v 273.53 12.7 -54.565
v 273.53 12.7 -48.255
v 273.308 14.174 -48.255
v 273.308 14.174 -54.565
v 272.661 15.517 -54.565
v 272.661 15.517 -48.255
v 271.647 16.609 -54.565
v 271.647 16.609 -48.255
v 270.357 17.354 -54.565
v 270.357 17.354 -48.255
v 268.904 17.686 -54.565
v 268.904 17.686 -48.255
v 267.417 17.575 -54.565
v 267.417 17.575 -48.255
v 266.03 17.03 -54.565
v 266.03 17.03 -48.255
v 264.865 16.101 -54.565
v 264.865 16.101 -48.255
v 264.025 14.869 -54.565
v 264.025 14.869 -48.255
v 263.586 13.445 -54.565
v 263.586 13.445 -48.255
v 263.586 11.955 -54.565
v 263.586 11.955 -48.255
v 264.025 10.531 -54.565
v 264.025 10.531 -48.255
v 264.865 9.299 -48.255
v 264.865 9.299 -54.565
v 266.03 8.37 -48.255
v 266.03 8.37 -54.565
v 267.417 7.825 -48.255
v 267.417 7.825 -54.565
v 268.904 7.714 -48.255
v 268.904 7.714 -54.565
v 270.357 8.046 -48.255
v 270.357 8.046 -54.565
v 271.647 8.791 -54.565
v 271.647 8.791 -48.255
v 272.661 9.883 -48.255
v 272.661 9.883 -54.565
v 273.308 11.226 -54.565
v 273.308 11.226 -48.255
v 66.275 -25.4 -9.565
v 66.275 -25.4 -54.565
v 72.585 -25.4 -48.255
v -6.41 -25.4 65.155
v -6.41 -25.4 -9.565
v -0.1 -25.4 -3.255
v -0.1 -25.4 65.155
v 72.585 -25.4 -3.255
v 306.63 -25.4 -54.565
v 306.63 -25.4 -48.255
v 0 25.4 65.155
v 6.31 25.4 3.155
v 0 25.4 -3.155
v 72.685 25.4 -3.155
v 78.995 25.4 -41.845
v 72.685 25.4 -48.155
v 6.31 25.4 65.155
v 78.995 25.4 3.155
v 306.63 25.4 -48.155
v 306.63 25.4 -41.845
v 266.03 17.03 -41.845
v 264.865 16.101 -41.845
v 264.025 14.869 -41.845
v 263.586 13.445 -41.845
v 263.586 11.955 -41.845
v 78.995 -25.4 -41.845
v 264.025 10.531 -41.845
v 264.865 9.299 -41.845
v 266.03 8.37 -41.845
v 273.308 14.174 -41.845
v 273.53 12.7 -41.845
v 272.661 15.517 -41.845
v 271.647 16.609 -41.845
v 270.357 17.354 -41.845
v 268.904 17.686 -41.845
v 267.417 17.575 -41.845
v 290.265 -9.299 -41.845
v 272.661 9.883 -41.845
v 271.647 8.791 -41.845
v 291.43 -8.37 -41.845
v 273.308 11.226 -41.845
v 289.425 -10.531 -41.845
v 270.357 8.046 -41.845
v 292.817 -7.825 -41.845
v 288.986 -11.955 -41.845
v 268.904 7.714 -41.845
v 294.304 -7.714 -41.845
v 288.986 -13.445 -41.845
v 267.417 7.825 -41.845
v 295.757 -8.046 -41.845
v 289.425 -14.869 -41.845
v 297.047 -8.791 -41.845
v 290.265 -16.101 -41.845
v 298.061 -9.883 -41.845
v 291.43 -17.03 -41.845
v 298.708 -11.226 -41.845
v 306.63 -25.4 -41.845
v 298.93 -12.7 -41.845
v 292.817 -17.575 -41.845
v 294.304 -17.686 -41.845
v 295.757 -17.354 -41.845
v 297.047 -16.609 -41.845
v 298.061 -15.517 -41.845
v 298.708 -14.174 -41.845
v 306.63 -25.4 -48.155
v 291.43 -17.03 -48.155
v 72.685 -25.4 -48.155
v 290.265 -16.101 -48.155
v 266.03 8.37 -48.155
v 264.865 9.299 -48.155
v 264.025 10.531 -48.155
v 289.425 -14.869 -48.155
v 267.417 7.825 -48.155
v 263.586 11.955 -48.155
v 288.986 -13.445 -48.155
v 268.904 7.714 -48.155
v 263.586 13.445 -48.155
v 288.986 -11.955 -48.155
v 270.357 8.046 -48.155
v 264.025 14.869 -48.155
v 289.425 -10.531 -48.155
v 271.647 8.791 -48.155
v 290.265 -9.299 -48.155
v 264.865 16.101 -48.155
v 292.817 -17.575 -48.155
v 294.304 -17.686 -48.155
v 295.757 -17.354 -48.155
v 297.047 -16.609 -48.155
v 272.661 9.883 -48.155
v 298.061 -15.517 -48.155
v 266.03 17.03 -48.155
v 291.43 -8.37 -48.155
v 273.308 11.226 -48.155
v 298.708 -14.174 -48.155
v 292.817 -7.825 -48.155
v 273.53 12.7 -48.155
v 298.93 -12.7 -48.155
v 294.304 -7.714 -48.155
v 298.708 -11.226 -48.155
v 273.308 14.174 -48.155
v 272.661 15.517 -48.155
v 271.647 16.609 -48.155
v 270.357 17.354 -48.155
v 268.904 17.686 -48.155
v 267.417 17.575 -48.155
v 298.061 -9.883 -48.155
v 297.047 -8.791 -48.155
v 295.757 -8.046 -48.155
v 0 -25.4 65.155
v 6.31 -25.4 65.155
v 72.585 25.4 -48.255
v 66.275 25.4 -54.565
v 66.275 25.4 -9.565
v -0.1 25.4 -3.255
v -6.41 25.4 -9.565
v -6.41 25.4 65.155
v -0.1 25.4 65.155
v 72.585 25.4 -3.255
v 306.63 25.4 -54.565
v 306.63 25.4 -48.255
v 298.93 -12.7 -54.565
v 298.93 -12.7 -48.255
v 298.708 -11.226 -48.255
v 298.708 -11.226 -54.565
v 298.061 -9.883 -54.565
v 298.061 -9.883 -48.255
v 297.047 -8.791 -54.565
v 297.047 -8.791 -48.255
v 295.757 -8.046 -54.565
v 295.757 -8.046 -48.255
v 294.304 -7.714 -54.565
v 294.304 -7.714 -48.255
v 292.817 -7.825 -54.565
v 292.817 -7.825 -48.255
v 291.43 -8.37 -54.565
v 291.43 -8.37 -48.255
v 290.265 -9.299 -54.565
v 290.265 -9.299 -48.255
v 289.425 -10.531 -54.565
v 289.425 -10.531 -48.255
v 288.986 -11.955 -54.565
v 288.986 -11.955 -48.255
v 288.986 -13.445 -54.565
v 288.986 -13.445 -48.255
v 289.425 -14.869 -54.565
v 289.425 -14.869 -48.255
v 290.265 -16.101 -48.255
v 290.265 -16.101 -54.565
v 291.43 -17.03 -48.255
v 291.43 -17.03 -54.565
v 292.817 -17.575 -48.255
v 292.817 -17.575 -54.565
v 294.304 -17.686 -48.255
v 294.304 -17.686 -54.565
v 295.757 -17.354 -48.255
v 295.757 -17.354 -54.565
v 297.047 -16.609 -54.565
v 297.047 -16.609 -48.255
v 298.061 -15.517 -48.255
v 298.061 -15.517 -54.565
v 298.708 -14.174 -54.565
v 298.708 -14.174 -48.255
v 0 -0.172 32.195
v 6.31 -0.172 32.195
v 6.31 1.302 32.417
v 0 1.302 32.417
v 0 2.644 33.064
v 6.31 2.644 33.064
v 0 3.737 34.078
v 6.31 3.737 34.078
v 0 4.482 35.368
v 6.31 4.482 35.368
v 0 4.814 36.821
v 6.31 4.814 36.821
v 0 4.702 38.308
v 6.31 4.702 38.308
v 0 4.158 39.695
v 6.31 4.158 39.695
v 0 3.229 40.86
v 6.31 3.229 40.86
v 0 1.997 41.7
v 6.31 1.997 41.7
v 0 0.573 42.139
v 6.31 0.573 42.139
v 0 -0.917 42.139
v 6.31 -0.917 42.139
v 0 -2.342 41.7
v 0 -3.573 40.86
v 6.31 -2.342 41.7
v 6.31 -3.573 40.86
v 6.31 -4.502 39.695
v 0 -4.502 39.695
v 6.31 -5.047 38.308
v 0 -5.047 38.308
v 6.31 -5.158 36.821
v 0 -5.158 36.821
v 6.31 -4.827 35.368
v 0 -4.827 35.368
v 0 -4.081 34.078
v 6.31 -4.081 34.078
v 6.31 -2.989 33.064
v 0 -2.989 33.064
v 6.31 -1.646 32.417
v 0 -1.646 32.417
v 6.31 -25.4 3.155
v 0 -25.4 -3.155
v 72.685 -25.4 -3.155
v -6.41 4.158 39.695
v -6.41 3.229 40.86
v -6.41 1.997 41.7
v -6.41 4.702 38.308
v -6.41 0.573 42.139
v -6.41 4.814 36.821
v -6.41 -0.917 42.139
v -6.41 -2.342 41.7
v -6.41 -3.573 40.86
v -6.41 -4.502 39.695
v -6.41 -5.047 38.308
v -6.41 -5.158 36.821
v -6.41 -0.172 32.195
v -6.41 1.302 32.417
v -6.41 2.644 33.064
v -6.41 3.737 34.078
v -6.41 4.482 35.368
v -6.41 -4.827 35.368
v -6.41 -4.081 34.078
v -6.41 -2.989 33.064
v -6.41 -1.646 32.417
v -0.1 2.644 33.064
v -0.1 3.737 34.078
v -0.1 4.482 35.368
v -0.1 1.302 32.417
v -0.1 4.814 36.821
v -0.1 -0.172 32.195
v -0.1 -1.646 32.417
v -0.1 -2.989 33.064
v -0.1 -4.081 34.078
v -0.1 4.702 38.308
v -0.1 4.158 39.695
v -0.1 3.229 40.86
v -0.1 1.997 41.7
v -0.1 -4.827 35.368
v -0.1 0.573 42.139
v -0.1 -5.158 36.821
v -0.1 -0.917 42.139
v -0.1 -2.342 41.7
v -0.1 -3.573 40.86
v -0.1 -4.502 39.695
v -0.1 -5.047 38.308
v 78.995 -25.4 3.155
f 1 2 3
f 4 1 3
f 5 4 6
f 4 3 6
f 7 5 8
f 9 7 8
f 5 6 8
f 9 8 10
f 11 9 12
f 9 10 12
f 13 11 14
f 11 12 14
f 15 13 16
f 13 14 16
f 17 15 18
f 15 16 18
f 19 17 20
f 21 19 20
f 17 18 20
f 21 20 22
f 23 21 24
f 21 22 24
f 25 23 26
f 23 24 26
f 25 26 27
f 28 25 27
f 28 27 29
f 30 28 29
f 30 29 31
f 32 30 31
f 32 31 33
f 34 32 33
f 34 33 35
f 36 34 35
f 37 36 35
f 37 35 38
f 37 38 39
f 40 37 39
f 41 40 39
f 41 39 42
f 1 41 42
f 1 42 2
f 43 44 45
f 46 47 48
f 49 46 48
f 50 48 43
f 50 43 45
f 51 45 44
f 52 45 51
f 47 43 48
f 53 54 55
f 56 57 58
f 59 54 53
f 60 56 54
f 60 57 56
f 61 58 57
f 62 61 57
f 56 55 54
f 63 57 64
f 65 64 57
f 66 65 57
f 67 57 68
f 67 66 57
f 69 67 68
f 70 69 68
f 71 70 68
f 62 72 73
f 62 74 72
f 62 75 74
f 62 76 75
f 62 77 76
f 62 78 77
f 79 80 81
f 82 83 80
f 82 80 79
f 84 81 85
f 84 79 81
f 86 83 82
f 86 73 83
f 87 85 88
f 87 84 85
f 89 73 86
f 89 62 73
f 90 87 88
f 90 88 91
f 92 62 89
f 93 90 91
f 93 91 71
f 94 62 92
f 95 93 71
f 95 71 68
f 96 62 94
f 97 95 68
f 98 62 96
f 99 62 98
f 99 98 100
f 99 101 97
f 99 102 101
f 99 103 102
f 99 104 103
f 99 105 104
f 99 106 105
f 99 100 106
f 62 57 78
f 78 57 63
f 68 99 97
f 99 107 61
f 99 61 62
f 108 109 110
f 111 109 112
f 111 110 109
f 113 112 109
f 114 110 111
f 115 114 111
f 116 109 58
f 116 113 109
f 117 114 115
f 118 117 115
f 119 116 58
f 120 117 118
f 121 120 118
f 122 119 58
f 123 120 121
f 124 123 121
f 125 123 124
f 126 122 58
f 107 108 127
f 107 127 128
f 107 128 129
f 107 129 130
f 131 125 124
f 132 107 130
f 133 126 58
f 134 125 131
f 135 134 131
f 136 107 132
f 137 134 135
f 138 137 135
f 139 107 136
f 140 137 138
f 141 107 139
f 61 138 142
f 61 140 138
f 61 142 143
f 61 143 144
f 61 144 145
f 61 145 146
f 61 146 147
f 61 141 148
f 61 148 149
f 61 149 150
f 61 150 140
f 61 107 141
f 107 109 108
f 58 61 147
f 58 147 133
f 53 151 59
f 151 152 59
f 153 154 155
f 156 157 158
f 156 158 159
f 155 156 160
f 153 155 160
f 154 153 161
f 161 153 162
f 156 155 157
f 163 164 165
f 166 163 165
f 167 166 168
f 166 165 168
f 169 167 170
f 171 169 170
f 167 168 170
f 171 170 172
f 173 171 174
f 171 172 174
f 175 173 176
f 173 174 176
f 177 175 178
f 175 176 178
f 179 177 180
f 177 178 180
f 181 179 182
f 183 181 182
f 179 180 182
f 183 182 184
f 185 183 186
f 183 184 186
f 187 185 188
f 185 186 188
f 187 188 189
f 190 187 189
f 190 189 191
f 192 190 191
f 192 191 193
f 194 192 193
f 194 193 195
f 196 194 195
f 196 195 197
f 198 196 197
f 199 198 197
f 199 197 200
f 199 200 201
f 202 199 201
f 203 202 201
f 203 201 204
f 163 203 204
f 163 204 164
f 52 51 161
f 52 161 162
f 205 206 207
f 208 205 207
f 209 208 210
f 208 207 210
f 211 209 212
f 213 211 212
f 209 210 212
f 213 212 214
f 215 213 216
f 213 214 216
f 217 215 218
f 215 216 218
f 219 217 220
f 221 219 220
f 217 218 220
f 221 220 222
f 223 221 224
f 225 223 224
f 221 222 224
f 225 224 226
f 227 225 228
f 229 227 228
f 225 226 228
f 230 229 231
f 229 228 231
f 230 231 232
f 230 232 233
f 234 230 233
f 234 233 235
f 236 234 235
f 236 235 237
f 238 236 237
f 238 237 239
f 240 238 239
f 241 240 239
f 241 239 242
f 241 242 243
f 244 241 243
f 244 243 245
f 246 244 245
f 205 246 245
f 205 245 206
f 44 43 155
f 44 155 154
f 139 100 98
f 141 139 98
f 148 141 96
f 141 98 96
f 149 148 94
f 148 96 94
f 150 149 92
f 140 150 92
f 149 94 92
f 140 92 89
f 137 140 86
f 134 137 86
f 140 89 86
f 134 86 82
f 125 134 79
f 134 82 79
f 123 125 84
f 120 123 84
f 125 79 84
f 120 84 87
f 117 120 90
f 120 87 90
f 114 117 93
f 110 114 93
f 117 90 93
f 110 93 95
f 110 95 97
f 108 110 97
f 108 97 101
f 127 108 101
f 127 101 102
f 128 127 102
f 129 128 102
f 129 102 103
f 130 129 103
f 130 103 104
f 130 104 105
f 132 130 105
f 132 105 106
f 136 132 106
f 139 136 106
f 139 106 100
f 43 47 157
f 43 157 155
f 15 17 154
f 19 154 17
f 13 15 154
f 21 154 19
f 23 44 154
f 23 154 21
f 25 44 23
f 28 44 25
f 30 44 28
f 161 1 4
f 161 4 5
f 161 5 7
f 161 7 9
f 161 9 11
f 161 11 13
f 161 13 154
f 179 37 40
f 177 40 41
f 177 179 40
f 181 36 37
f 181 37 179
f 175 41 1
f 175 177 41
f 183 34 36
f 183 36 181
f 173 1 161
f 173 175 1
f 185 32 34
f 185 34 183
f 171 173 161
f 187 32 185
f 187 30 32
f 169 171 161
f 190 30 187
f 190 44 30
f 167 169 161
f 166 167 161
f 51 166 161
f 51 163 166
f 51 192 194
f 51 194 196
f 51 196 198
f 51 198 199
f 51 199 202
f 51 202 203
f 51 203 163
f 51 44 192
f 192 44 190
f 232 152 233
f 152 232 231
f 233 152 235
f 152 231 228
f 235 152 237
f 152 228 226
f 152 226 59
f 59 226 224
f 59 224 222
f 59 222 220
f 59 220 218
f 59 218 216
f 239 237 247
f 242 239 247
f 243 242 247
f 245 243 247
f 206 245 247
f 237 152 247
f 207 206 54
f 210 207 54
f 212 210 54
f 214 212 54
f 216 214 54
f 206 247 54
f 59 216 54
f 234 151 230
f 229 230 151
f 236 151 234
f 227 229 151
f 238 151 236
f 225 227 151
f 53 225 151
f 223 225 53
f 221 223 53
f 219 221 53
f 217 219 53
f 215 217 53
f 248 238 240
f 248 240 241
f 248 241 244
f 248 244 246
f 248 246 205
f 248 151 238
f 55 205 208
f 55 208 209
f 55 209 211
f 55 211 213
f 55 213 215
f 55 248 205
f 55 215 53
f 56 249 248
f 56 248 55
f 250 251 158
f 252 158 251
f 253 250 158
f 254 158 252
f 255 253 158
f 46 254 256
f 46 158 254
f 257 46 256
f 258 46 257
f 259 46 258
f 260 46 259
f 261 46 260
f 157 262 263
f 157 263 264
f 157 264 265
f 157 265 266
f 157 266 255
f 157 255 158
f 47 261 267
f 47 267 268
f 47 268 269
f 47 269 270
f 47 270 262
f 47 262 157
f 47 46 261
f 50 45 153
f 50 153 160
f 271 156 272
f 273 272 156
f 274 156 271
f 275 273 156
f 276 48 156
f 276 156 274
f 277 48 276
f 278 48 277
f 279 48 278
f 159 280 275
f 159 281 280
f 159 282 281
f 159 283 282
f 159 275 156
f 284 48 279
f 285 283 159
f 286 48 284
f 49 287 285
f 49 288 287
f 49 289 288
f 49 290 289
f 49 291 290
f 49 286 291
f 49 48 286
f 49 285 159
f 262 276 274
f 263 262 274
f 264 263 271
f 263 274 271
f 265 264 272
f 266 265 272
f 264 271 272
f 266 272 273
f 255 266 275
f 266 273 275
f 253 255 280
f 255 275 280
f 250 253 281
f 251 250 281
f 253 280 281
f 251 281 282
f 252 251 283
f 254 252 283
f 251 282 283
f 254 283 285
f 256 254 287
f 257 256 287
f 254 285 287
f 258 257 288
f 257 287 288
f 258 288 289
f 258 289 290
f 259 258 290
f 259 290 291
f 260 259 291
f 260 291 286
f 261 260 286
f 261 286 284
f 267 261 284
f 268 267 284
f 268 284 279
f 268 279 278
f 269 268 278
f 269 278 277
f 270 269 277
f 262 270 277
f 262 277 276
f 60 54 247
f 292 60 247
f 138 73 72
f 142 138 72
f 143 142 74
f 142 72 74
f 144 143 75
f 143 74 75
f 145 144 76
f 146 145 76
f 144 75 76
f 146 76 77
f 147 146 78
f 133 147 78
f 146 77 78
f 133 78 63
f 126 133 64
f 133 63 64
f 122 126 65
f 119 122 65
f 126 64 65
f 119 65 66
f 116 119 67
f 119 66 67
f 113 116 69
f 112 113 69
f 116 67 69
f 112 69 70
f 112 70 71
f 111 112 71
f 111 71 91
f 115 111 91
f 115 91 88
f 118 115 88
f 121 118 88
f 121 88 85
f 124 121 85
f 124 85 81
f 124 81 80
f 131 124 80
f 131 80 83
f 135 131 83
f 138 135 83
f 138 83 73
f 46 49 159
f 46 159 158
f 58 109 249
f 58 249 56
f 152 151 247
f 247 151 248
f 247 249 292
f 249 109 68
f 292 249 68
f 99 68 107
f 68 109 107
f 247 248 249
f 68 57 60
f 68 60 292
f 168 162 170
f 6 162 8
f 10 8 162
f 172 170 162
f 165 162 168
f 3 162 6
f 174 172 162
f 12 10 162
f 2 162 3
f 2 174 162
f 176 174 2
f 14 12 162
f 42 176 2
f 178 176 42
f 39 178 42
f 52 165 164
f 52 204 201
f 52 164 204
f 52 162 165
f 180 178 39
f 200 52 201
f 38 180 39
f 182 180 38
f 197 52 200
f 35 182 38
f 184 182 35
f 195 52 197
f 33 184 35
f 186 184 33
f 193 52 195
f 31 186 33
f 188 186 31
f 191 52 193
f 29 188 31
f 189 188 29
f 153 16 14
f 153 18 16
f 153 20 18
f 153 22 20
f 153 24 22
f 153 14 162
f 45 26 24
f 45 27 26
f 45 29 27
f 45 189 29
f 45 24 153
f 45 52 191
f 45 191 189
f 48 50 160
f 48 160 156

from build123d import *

# Parameters (mm, degrees)
CROQUIS2_W              = 6.31
CROQUIS2_H              = 50.8
CROQUIS3_W              = 6.31
CROQUIS3_H              = 50.8
SALIENTE_EXTRUIR1_DEPTH = 62
CROQUIS4_W              = 6.31
CROQUIS4_H              = 50.8
SALIENTE_EXTRUIR2_DEPTH = 40
CROQUIS5_R              = 6.35
CORTAR_EXTRUIR1_DEPTH   = 10
CROQUIS6_W              = 50.8
CROQUIS6_H              = 6.31
SALIENTE_EXTRUIR3_DEPTH = 50.8
CROQUIS7_W              = 50.8
CROQUIS7_H              = 362.6
CORTAR_EXTRUIR2_DEPTH   = 67
CROQUIS8_W              = 50.8
CROQUIS8_H              = 50.8
CORTAR_EXTRUIR3_DEPTH   = 67
SALIENTE_EXTRUIR4_DEPTH = 50.8
CROQUIS10_R             = 5
CORTAR_EXTRUIR4_DEPTH   = 24.525
CROQUIS11_R             = 5
CORTAR_EXTRUIR5_DEPTH   = 35


with BuildPart() as part:
    # Barrer1: sweep along a curve in space
    with BuildLine() as barrer1_path:
        Line((0, 0, 0), (75.84, 0, 0))
        Line((75.84, 0, 0), (75.84, 0, -45))
        Line((75.84, 0, -45), (281.23, 0, -45))
        Line((281.23, 0, -45), (281.23, -388, -45))
    # Croquis2 → Barrer1 (sweep)
    with BuildSketch(Plane(origin=(0, 0, 0), x_dir=(0, 0, -1), z_dir=(1, 0, 0))):
        Rectangle(CROQUIS2_W, CROQUIS2_H)
    sweep(path=barrer1_path.line, transition=Transition.RIGHT)

    # Croquis3 → Saliente-Extruir1 (add)
    with BuildSketch(Plane.XY.offset(3.155)):
        with Locations((3.155, 0)):
            Rectangle(CROQUIS3_W, CROQUIS3_H)
    extrude(amount=SALIENTE_EXTRUIR1_DEPTH)

    # Croquis4 → Saliente-Extruir2 (add)
    with BuildSketch(Plane.XY.offset(-41.845)):
        with Locations((258.985, -362.6)):
            Rectangle(CROQUIS4_W, CROQUIS4_H)
    extrude(amount=SALIENTE_EXTRUIR2_DEPTH)

    # Croquis5 → Cortar-Extruir1 (cut)
    with BuildSketch(Plane(origin=(262.14, 0, 0), x_dir=(0, 0, -1), z_dir=(1, 0, 0))):
        with Locations(Location((16.155, -346.6, 0), (0, 0, 90))):
            Circle(CROQUIS5_R)
        with Locations(Location((16.155, -378.6, 0), (0, 0, 90))):
            Circle(CROQUIS5_R)
    extrude(amount=-CORTAR_EXTRUIR1_DEPTH, mode=Mode.SUBTRACT)

    # Croquis6 → Saliente-Extruir3 (add)
    with BuildSketch(Plane.ZY):
        with Locations((39.755, 22.245)):
            Rectangle(CROQUIS6_W, CROQUIS6_H)
    extrude(amount=SALIENTE_EXTRUIR3_DEPTH)

    # Croquis7 → Cortar-Extruir2 (cut)
    with BuildSketch(Plane(origin=(0, 0, -48.155), x_dir=(-1, 0, 0), z_dir=(0, 0, -1))):
        with Locations((-281.23, -206.7)):
            Rectangle(CROQUIS7_W, CROQUIS7_H)
    extrude(amount=-CORTAR_EXTRUIR2_DEPTH, mode=Mode.SUBTRACT)

    # Croquis8 → Cortar-Extruir3 (cut)
    with BuildSketch(Plane.XZ.offset(-19.09)):
        with Locations((-25.4, 39.755)):
            Rectangle(CROQUIS8_W, CROQUIS8_H)
    extrude(amount=-CORTAR_EXTRUIR3_DEPTH, mode=Mode.SUBTRACT)


with BuildPart() as body_2:
    # Croquis9 → Saliente-Extruir4 (new body)
    with BuildSketch(Plane.XZ.offset(25.4)):
        Polygon((-0.1, 65.155), (-1.925533234, 65.155), (-6.41, 65.155), (-6.41, -9.565), (66.275, -9.565), (66.275, -54.565), (306.63, -54.565), (306.63, -48.255), (72.585, -48.255), (72.585, -3.255), (-0.1, -3.255), align=None)
    extrude(amount=-SALIENTE_EXTRUIR4_DEPTH)


with BuildPart() as cortar_extruir4_tool:
    # Croquis10 → Cortar-Extruir4 (new body)
    with BuildSketch(Plane(origin=(6.31, 0, 0), x_dir=(0, 0, -1), z_dir=(1, 0, 0))):
        with Locations((-37.195, -0.172201783)):
            Circle(CROQUIS10_R)
    extrude(amount=-CORTAR_EXTRUIR4_DEPTH)


with BuildPart() as part_1:
    add(part.part)

    # Cortar-Extruir4: cut by cortar_extruir4_tool
    add(cortar_extruir4_tool.part, mode=Mode.SUBTRACT)


with BuildPart() as body_2_1:
    add(body_2.part)

    # Cortar-Extruir4: cut by cortar_extruir4_tool
    add(cortar_extruir4_tool.part, mode=Mode.SUBTRACT)


with BuildPart() as cortar_extruir5_tool:
    # Croquis11 → Cortar-Extruir5 (new body)
    with BuildSketch(Plane.XY.offset(-41.845)):
        with Locations((293.93, -12.7)):
            Circle(CROQUIS11_R)
        with Locations((268.53, 12.7)):
            Circle(CROQUIS11_R)
    extrude(amount=-CORTAR_EXTRUIR5_DEPTH)


with BuildPart() as part_2:
    add(part_1.part)

    # Cortar-Extruir5: cut by cortar_extruir5_tool
    add(cortar_extruir5_tool.part, mode=Mode.SUBTRACT)


with BuildPart() as body_2_2:
    add(body_2_1.part)

    # Cortar-Extruir5: cut by cortar_extruir5_tool
    add(cortar_extruir5_tool.part, mode=Mode.SUBTRACT)


solid = Compound([part_2.part, body_2_2.part])
